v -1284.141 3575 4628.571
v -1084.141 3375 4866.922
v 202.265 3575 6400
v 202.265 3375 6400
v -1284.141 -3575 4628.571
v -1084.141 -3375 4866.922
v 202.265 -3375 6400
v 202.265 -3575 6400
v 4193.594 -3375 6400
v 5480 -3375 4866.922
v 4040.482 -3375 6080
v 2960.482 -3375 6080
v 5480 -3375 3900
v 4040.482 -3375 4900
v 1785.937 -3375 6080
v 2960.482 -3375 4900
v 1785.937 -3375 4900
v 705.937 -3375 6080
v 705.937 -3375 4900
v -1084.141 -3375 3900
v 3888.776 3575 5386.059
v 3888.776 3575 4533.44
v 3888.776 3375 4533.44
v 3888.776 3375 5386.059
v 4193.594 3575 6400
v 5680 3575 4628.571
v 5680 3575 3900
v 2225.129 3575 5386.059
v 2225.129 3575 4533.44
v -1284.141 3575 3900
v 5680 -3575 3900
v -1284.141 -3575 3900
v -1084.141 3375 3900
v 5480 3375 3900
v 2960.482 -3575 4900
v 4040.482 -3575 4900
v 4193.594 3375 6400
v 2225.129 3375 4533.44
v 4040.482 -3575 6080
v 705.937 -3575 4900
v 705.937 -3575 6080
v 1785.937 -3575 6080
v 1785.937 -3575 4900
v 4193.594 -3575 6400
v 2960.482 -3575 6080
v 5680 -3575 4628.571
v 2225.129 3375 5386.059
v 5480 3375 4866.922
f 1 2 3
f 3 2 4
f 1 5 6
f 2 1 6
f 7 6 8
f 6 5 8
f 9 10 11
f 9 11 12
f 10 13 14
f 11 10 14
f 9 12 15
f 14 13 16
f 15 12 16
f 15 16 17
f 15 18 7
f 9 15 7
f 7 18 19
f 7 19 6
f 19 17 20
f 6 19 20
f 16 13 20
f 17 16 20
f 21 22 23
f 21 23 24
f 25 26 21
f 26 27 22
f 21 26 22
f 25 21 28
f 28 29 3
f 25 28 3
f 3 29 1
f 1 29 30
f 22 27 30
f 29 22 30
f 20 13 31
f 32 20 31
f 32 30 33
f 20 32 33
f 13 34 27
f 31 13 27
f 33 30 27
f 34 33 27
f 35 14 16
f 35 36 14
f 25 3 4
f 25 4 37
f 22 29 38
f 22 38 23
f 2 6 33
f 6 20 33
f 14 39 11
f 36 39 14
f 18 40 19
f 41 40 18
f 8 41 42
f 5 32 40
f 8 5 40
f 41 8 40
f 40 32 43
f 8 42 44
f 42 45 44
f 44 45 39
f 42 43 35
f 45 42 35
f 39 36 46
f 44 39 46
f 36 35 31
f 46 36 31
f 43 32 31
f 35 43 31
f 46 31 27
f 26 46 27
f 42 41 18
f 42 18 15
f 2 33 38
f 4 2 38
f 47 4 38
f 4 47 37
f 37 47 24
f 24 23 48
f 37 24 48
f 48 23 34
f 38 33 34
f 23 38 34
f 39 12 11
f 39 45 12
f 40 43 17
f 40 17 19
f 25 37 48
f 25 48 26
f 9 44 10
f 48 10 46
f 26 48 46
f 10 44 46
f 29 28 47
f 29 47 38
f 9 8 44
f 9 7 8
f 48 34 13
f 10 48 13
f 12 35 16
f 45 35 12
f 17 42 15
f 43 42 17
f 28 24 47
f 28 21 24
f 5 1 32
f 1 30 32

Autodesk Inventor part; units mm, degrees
ref_plane "YZ Plane" through (0, 0, 0) normal (1, 0, 0) x (0, 1, 0)
ref_plane "XZ Plane" through (0, 0, 0) normal (0, 1, 0) x (-1, 0, 0)
ref_plane "XY Plane" through (0, 0, 0) normal (0, 0, 1) x (1, 0, 0)
ref_plane "Arbeitsebene1" through (0, 0, 3900) normal (0, 0, 1) x (1, 0, 0)
sketch "Skizze1" plane through (0, 0, 3900) normal (0, 0, 1) x (1, 0, 0)
  line L0 (5680, -3575) -> (5680, 3575) projected
  line L1 (5680, 3575) -> (-5680, 3575) projected
  line L2 (-5680, -3575) -> (5680, -3575) projected
  line L3 (-1284.1409, 3575) -> (5680, 3575)
  line L4 (5680, 3575) -> (5680, -3575)
  line L5 (5680, -3575) -> (-1284.1409, -3575)
  line L6 (-1084.1409, 3375) -> (5480, 3375)
  line L7 (5480, 3375) -> (5480, -3375)
  line L8 (5480, -3375) -> (-1084.1409, -3375)
  line L9 (-1284.1409, -3575) -> (-1234.707, -3575)
  line L10 (-1084.1409, -3375) -> (-1084.1409, 3375)
  line L11 (-1234.707, 3575) -> (-1284.1409, 3575)
  line L12 (-1284.1409, 3575) -> (-1284.1409, -3575)
  dimension "d0" = 200
  dimension "d2" = 200
  dimension "d3" = 200
  dimension "d6" = 200
extrude "Extrusion1" add sketch "Skizze1" along normal blind 2500
sketch "Skizze2" plane through (-1284.1409, -3575, 3900) normal (0, -1, 0) x (1, 0, 0)
  line L0 (0, 0) -> (6964.1409, 0) projected
  line L1 (6964.1409, 0) -> (6964.1409, 2500) projected
  line L2 (0, 2500) -> (6964.1409, 2500) projected
  line L3 (0, 0) -> (0, 2500) projected
  line L4 (0, 0) -> (0, 2500) projected
  line L5 (0, 728.5709) -> (1486.4055, 2500)
  line L6 (6764.1409, 2500) -> (200, 2500) projected
  line L7 (1486.4055, 2500) -> (0, 2500)
  line L8 (0, 728.5709) -> (0, 2500)
  line L9 (5477.7354, 2500) -> (6964.1409, 728.5709)
  line L10 (6964.1409, 0) -> (6964.1409, 2500) projected
  line L11 (6964.1409, 2500) -> (6964.1409, 728.5709)
  line L12 (6964.1409, 2500) -> (5477.7354, 2500)
  dimension "d13" = 40
  dimension "d14" = 40
extrude "Extrusion2" cut sketch "Skizze2" against normal up to surface (7150 mm away) contours L3 L2 L5 | L9 L2 L1
sketch "Skizze3" plane through (-1284.1409, -3575, 3900) normal (0, -1, 0) x (1, 0, 0)
  line L0 (1486.4055, 2500) -> (0, 728.5709) projected
  line L1 (0, 0) -> (0, 728.5709) projected
  line L2 (0, 0) -> (6964.1409, 0) projected
  line L3 (6964.1409, 0) -> (6964.1409, 728.5709) projected
  line L4 (1486.4055, 2500) -> (5477.7354, 2500) projected
  line L5 (1990.078, 2180) -> (3070.078, 2180)
  line L6 (3070.078, 2180) -> (3070.078, 1000)
  line L7 (3070.078, 1000) -> (1990.078, 1000)
  line L8 (1990.078, 1000) -> (1990.078, 2180)
  line L9 (4244.6225, 2180) -> (5324.6225, 2180)
  line L10 (5324.6225, 2180) -> (5324.6225, 1000)
  line L11 (5324.6225, 1000) -> (4244.6225, 1000)
  line L12 (4244.6225, 1000) -> (4244.6225, 2180)
  line L13 (6964.1409, 728.5709) -> (5477.7354, 2500) projected
  dimension "d15" = 1080
  dimension "d16" = 1080
  dimension "d17" = 1180
  dimension "d18" = 1000
extrude "Extrusion3" cut sketch "Skizze3" against normal up to surface (200 mm away) contours L5 L6 L7 L8 | L9 L10 L11 L12
sketch "Skizze4" plane through (-1284.1409, 3575, 3900) normal (0, 1, 0) x (1, 0, 0)
  line L0 (5172.9172, -1486.059) -> (3509.2696, -1486.059)
  line L1 (3509.2696, -1486.059) -> (3509.2696, -633.4396)
  line L2 (3509.2696, -633.4396) -> (5172.9172, -633.4396)
  line L3 (5172.9172, -633.4396) -> (5172.9172, -1486.059)
extrude "Extrusion4" cut sketch "Skizze4" against normal up to surface (200 mm away)
equation "\"d14\" = d13"
equation "\"d16\" = d15"
properties part number "Aussenwände_oben"
